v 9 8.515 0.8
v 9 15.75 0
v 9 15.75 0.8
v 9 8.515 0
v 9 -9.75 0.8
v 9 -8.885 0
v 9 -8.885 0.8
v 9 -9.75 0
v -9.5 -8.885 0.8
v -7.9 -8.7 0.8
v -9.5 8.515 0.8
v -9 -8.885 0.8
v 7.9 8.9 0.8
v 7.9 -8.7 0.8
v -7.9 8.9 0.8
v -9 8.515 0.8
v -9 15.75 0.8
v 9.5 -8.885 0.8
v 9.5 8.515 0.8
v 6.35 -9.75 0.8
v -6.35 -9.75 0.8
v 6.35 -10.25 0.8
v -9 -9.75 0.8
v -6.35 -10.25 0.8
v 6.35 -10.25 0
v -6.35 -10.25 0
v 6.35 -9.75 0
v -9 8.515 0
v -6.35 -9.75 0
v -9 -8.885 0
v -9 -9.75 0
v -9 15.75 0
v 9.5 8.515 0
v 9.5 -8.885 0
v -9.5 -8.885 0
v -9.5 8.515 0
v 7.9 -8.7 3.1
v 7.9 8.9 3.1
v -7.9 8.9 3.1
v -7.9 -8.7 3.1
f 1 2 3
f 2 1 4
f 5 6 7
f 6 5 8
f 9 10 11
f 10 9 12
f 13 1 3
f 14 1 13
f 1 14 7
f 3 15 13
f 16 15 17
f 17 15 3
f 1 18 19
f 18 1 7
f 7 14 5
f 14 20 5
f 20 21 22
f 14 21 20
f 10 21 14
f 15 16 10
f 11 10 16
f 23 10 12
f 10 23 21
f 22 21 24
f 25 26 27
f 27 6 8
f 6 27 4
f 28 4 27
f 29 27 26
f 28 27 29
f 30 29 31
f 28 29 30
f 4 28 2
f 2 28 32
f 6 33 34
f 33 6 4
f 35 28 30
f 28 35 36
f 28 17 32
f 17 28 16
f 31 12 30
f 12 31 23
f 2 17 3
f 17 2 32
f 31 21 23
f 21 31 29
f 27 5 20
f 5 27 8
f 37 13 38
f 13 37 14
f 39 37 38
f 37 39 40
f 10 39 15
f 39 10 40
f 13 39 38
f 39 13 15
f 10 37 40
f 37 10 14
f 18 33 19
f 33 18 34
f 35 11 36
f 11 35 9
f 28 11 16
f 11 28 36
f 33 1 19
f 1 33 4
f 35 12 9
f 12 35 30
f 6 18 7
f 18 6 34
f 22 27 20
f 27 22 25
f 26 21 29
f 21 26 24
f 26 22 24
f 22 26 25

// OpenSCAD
translate([-9,-9.75,0])
{
	cube([18,25.50,0.80]);
	translate([1.1,1.05,0])cube([15.80,17.60,3.10]);
	translate([-0.5,0.865,0])cube([19,17.4,0.8]);
	translate([2.65,-0.5,0])cube([12.7,2,0.8]);

}
